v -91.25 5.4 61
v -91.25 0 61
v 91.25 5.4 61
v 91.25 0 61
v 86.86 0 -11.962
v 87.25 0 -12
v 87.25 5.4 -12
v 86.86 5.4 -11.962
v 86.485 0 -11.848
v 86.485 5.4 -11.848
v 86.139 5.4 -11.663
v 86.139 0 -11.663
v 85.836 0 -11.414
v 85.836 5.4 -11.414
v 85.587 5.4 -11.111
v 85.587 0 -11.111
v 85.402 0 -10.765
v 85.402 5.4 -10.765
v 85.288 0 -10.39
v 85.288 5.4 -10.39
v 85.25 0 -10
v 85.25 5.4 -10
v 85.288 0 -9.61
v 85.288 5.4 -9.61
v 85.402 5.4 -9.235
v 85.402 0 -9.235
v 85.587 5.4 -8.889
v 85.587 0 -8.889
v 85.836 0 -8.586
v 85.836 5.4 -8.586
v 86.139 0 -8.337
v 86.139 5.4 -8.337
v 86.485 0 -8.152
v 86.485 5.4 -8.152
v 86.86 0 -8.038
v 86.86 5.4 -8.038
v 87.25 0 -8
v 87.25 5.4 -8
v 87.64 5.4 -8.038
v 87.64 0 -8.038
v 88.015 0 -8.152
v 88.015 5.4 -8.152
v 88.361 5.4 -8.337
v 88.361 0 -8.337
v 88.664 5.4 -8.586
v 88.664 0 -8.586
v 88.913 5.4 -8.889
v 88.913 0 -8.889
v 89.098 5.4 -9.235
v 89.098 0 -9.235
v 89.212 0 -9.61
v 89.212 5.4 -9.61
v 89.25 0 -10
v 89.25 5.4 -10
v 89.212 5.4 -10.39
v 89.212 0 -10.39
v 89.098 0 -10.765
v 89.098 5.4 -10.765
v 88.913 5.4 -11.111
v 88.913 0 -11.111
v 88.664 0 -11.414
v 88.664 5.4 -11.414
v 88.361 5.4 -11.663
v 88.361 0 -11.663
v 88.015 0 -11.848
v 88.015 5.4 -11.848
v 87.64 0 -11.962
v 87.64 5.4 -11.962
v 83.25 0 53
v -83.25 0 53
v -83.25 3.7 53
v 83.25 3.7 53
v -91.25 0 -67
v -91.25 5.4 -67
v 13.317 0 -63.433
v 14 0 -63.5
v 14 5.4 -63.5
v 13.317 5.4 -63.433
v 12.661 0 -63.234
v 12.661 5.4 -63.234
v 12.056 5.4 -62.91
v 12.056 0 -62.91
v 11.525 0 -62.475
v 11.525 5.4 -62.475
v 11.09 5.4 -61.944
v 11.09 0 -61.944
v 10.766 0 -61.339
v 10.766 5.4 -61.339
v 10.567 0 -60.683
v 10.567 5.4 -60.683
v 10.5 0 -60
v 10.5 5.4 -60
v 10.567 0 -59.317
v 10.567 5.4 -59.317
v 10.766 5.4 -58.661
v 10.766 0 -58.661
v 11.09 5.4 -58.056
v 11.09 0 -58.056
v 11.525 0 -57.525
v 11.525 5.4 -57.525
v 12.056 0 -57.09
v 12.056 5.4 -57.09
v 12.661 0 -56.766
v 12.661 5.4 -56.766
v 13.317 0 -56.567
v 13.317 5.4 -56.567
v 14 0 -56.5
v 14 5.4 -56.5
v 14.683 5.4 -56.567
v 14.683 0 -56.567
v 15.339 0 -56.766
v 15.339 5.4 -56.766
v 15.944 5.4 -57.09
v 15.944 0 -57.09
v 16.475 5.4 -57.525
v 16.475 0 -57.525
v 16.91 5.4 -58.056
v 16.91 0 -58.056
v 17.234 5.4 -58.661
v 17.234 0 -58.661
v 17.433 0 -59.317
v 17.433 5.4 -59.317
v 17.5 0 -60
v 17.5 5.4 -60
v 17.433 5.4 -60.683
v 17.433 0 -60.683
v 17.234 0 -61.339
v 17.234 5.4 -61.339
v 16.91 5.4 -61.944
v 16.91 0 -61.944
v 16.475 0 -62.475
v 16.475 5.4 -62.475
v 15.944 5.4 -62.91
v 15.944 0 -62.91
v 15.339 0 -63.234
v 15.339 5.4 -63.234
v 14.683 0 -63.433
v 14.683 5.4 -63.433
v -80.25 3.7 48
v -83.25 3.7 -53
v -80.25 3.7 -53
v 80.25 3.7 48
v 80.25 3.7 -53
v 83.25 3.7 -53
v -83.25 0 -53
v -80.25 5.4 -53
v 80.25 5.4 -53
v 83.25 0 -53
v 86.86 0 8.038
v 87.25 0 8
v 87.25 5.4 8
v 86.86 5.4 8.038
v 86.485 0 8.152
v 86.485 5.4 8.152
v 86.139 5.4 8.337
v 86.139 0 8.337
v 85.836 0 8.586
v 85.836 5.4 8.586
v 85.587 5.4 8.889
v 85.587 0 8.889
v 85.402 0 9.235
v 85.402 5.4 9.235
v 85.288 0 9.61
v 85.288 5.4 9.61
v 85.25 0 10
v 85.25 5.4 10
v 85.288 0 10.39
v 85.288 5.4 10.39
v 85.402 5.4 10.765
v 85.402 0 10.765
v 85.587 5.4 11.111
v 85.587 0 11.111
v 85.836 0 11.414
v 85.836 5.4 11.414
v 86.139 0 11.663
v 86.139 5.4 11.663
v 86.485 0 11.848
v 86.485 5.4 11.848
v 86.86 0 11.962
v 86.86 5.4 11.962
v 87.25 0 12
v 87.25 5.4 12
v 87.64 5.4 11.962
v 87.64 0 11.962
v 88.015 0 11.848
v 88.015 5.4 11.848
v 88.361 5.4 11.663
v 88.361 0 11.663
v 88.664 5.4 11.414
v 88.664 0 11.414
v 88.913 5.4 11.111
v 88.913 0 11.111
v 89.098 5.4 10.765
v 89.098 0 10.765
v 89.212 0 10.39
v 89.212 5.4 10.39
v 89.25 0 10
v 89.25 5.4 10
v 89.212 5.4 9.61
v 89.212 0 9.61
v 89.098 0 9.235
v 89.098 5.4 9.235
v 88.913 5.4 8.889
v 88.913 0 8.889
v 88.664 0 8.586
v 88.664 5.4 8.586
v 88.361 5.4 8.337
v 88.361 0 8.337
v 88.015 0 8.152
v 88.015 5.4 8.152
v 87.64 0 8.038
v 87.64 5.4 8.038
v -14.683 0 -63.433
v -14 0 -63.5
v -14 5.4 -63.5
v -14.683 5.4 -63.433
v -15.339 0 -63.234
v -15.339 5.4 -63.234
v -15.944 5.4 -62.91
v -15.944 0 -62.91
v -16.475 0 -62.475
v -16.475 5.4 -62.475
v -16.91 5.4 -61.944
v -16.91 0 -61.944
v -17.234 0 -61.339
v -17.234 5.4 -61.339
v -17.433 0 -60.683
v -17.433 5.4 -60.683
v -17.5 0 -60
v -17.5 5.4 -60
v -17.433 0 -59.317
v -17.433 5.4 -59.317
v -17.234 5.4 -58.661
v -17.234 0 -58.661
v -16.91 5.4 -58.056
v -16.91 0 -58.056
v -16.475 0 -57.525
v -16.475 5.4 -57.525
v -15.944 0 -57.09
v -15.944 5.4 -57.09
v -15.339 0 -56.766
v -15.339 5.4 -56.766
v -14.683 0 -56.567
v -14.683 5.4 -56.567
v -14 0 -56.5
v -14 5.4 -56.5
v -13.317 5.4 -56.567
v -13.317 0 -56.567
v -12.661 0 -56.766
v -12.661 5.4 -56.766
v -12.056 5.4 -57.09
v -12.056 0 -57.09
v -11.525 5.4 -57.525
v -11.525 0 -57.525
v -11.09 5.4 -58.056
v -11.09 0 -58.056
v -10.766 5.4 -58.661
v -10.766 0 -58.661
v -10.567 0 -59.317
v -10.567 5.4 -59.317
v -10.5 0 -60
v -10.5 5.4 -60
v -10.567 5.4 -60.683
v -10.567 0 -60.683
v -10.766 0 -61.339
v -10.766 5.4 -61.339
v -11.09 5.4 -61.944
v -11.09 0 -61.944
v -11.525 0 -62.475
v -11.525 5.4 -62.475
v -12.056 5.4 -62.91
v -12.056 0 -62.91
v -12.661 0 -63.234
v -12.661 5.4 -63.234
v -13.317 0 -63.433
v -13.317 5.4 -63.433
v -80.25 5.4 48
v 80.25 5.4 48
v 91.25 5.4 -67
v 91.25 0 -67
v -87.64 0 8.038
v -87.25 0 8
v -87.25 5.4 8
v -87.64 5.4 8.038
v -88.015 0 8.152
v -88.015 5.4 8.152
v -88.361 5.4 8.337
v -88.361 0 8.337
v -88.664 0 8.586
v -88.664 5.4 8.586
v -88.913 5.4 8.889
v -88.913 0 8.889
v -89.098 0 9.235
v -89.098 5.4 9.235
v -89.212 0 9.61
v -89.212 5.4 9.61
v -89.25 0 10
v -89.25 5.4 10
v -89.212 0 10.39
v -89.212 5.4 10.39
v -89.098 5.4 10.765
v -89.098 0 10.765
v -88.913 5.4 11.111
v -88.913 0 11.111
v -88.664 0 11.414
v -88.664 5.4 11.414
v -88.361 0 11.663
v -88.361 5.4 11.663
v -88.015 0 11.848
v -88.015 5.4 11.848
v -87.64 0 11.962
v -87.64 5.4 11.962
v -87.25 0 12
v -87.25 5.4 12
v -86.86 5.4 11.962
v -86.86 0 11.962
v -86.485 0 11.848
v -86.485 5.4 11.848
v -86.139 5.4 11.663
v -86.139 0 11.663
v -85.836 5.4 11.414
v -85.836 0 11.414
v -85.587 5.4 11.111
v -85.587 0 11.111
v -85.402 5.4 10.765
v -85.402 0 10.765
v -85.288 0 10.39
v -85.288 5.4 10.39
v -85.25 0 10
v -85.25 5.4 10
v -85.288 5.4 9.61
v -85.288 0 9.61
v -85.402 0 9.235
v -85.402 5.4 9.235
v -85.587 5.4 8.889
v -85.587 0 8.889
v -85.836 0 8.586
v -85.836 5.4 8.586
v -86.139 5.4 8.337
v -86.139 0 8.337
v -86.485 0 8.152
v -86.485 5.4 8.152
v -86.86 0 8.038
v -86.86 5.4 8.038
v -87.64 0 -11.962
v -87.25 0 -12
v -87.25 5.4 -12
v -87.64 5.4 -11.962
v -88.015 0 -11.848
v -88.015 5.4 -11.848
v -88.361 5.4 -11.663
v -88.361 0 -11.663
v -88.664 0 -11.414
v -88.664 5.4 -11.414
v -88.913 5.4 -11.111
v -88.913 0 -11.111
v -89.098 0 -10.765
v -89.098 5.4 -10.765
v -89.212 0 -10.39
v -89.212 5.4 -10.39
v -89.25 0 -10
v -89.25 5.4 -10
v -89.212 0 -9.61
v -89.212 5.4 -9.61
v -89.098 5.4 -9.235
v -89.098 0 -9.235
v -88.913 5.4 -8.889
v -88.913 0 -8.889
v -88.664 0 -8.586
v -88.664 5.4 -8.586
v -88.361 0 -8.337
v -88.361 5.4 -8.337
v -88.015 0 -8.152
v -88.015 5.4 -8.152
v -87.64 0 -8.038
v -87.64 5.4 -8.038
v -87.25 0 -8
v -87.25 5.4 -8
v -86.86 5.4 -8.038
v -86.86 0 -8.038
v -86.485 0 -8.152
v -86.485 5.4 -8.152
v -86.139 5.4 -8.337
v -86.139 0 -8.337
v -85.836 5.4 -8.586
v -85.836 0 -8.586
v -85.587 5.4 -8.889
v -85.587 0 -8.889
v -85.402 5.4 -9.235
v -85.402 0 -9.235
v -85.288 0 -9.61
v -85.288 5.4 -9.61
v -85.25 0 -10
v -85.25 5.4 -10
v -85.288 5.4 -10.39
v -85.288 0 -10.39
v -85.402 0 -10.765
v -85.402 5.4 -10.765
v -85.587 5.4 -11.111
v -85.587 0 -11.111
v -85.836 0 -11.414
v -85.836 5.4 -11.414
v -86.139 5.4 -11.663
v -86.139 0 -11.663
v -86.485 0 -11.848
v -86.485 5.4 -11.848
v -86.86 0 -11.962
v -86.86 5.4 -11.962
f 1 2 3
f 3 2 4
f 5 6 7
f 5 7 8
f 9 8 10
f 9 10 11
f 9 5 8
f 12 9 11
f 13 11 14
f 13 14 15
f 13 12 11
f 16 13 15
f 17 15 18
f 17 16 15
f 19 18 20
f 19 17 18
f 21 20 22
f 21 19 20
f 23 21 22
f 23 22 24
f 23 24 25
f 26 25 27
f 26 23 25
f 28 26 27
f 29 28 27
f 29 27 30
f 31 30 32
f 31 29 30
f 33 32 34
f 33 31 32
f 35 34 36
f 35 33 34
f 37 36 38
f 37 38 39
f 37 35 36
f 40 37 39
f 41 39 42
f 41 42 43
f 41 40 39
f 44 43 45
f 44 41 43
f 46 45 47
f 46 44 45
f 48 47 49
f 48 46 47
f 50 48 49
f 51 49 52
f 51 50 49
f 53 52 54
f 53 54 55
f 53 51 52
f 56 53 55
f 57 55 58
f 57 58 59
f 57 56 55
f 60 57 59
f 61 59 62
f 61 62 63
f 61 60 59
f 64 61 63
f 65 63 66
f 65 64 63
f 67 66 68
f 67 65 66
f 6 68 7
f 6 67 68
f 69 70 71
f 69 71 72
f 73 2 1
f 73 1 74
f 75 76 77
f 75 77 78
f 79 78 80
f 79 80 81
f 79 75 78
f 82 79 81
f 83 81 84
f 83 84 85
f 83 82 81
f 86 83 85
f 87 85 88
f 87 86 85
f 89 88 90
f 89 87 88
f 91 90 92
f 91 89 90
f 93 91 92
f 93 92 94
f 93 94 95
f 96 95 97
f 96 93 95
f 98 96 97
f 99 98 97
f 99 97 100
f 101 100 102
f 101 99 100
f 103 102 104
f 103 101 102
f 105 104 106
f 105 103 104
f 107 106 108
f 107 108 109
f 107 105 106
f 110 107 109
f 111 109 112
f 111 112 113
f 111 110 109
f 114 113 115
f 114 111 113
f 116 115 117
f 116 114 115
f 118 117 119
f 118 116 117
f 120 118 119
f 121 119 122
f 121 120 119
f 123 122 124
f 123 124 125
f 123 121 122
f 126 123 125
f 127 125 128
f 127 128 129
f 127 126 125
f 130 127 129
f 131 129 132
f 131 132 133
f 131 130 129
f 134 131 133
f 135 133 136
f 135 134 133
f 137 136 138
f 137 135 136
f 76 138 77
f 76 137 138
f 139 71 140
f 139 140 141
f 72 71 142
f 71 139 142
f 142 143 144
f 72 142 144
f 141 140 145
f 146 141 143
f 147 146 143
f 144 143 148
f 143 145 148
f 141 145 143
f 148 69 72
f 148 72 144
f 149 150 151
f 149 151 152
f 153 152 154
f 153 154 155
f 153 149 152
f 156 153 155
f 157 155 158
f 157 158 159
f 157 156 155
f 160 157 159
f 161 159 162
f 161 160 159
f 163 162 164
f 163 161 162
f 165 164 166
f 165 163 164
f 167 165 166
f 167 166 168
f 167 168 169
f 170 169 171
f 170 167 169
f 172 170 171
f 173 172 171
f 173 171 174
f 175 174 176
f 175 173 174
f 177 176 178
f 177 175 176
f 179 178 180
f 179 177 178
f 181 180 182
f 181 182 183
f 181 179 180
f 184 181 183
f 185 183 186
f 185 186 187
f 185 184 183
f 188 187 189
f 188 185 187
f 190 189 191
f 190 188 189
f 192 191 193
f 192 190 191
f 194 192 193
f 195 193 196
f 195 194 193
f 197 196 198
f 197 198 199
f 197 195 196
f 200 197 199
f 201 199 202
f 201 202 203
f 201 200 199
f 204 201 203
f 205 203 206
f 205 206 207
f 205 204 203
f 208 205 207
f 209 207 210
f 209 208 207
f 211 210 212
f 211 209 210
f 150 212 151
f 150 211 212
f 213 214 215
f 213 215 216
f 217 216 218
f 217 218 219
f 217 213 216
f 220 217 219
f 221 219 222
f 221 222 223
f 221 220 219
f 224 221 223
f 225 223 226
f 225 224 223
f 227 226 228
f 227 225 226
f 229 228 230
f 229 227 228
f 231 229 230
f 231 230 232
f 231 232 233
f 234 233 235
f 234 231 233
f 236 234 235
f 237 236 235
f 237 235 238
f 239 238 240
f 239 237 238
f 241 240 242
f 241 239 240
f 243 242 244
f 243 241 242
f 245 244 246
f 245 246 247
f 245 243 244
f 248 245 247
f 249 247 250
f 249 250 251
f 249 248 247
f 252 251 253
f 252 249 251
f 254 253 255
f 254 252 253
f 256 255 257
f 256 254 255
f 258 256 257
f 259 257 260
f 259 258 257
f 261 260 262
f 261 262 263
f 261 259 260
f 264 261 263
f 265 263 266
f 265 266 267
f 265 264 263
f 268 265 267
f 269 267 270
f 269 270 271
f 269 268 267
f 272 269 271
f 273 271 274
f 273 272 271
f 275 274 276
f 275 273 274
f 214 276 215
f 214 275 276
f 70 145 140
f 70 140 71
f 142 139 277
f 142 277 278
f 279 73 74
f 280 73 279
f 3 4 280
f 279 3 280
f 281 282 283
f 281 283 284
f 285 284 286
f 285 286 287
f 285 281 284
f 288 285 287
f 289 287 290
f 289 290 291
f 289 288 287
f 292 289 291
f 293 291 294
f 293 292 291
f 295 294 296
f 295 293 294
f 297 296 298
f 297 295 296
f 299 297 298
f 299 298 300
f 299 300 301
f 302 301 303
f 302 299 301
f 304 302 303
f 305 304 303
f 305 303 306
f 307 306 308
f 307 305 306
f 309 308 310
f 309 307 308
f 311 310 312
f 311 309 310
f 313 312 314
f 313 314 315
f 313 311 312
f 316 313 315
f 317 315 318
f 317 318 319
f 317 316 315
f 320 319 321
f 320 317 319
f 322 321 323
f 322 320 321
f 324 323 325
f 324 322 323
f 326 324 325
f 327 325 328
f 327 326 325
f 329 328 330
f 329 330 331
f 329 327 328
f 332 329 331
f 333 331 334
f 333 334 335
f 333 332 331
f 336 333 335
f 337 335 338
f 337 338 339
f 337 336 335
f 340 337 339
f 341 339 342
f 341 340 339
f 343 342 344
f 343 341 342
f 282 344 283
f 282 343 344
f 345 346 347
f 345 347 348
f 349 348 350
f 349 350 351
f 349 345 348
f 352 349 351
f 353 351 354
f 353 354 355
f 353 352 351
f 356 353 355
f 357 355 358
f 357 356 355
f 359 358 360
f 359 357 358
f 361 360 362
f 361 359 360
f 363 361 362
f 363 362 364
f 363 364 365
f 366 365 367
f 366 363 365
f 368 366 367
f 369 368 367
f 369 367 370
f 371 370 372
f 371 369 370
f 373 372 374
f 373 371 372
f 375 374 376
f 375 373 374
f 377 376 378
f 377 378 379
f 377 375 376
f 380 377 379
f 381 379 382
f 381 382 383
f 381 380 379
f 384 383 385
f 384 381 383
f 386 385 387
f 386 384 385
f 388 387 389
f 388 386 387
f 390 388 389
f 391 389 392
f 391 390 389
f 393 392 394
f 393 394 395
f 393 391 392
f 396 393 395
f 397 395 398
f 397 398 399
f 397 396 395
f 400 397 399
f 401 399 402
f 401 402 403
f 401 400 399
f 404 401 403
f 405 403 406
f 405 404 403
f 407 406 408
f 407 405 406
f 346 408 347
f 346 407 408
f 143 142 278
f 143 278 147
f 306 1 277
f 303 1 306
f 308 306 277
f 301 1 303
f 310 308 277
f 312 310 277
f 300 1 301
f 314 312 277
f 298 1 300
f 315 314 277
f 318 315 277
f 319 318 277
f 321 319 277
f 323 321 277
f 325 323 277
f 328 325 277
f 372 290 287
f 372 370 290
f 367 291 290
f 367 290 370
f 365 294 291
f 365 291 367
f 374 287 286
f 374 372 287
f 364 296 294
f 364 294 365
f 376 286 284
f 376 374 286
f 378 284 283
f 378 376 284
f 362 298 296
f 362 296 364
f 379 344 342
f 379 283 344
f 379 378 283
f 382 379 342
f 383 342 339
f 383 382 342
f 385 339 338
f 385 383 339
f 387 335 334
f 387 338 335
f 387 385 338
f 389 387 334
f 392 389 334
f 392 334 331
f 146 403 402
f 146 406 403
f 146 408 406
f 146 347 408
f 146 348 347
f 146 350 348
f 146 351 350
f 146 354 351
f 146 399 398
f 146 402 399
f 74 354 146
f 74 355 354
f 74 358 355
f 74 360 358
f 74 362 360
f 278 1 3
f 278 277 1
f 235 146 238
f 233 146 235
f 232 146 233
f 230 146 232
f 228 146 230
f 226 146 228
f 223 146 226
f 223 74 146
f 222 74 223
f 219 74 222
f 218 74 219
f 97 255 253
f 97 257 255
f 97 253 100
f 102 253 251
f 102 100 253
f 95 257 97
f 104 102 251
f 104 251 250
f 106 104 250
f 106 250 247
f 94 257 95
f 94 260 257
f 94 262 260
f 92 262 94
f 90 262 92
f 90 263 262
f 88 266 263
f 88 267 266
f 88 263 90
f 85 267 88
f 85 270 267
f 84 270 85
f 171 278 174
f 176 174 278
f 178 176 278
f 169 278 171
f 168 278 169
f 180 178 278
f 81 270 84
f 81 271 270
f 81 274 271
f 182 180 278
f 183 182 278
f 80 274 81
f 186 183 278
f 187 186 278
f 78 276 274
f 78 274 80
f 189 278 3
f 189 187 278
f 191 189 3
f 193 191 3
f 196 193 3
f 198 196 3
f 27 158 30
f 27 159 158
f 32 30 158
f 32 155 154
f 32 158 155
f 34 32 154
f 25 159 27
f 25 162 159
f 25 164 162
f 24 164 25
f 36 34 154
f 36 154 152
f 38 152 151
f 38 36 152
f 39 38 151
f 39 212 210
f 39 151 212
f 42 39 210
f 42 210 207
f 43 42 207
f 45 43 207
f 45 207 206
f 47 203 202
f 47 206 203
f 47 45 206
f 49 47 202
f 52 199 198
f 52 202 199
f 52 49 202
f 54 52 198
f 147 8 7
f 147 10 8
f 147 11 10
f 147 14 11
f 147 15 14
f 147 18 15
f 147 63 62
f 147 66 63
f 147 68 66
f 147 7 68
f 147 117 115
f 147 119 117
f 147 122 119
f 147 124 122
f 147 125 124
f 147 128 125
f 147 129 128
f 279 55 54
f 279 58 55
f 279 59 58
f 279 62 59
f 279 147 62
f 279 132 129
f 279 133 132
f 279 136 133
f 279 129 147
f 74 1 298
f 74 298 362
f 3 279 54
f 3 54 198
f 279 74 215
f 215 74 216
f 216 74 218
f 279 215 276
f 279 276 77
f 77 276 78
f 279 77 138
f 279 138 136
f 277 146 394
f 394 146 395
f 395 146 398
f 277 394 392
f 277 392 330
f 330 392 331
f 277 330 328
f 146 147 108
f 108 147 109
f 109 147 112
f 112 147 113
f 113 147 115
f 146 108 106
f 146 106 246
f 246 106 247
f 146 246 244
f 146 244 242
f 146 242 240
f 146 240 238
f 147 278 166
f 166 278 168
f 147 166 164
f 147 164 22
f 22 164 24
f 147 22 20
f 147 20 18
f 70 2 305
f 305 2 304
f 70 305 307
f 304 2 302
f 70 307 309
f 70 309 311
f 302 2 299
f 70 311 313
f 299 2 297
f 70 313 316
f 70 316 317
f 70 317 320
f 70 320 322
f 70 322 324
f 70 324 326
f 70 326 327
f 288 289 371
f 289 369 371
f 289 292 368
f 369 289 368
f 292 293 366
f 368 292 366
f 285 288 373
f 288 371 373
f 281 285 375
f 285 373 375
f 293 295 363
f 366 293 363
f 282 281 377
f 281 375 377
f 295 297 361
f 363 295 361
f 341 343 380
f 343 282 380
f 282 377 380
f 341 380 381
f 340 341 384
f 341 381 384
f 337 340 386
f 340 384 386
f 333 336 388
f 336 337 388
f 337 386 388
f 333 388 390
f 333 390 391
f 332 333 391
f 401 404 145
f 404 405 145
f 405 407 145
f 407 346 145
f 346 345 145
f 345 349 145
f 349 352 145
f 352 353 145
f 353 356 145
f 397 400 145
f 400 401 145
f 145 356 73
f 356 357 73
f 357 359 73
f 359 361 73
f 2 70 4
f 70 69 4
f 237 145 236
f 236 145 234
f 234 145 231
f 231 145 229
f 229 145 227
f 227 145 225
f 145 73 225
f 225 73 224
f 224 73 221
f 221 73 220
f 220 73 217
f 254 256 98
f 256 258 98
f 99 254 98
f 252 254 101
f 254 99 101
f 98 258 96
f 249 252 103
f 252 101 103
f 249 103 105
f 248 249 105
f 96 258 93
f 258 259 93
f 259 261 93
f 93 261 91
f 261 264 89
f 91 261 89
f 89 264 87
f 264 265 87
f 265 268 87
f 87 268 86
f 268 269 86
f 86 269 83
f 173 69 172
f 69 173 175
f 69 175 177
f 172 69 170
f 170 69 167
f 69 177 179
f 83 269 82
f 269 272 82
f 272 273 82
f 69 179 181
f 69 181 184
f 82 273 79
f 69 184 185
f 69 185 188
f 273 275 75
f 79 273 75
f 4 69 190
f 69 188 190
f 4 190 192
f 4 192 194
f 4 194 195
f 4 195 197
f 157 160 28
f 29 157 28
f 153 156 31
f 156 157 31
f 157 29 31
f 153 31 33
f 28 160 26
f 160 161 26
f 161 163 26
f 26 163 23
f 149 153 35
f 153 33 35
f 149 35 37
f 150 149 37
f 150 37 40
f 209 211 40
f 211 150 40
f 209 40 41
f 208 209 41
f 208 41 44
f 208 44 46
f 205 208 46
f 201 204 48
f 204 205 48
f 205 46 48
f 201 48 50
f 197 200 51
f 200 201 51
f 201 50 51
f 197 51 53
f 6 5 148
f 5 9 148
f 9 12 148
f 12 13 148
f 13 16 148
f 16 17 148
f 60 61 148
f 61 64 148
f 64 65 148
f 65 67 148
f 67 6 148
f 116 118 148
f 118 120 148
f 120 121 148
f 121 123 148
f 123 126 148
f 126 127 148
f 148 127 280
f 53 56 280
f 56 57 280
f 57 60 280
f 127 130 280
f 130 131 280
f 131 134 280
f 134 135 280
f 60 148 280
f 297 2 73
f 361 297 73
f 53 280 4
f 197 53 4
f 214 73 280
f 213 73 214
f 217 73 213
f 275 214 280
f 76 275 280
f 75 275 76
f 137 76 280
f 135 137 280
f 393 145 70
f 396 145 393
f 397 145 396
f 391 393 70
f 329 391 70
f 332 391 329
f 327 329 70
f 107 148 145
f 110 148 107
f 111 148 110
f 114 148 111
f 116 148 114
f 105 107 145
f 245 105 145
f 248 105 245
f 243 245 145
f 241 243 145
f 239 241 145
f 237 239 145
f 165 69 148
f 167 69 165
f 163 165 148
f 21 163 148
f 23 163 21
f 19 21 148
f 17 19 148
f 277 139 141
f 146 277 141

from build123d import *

# Parameters (mm, degrees)
SKETCH1_W               = 182.5
SKETCH1_H               = 128
SKETCH1_R               = 3.5
SKETCH1_R_2             = 2
BOSS_EXTRUDE1_DEPTH     = 5.4
CUT_EXTRUDE3_DEPTH      = 114.334560042
CUT_EXTRUDE3_DEPTH_BACK = 114.334560042
SKETCH1_4_W             = 160.5
SKETCH1_4_H             = 101
CUT_EXTRUDE4_DEPTH      = 3.7


with BuildPart() as part:
    # Sketch1 → Boss-Extrude1 (new body)
    with BuildSketch(Plane(origin=(0, 0, 0), x_dir=(1, 0, 0), z_dir=(0, 1, 0))):
        with Locations((0, 3)):
            Rectangle(SKETCH1_W, SKETCH1_H)
        with Locations((-14, 60)):
            Circle(SKETCH1_R, mode=Mode.SUBTRACT)
        with Locations((14, 60)):
            Circle(SKETCH1_R, mode=Mode.SUBTRACT)
        with Locations((-87.25, -10)):
            Circle(SKETCH1_R_2, mode=Mode.SUBTRACT)
        with Locations((87.25, -10)):
            Circle(SKETCH1_R_2, mode=Mode.SUBTRACT)
        with Locations((-87.25, 10)):
            Circle(SKETCH1_R_2, mode=Mode.SUBTRACT)
        with Locations((87.25, 10)):
            Circle(SKETCH1_R_2, mode=Mode.SUBTRACT)
    extrude(amount=BOSS_EXTRUDE1_DEPTH)

    # Sketch1<4> → Cut-Extrude3 (cut, two sides: drawn at the far end of the back side and taken through both)
    with BuildSketch(Plane(origin=(0, 0, 0), x_dir=(1, 0, 0), z_dir=(0, 1, 0)).offset(-CUT_EXTRUDE3_DEPTH_BACK)):
        with Locations((0, 2.5)):
            Rectangle(SKETCH1_4_W, SKETCH1_4_H)
    extrude(amount=CUT_EXTRUDE3_DEPTH + CUT_EXTRUDE3_DEPTH_BACK, mode=Mode.SUBTRACT)

    # Sketch1<5> → Cut-Extrude4 (cut)
    with BuildSketch(Plane(origin=(0, 0, 0), x_dir=(1, 0, 0), z_dir=(0, 1, 0))):
        Polygon((-83.25, -53), (83.25, -53), (83.25, 53), (80.25, 53), (80.25, -48), (-80.25, -48), (-80.25, 53), (-83.25, 53), align=None)
    extrude(amount=CUT_EXTRUDE4_DEPTH, mode=Mode.SUBTRACT)


solid = part.part
